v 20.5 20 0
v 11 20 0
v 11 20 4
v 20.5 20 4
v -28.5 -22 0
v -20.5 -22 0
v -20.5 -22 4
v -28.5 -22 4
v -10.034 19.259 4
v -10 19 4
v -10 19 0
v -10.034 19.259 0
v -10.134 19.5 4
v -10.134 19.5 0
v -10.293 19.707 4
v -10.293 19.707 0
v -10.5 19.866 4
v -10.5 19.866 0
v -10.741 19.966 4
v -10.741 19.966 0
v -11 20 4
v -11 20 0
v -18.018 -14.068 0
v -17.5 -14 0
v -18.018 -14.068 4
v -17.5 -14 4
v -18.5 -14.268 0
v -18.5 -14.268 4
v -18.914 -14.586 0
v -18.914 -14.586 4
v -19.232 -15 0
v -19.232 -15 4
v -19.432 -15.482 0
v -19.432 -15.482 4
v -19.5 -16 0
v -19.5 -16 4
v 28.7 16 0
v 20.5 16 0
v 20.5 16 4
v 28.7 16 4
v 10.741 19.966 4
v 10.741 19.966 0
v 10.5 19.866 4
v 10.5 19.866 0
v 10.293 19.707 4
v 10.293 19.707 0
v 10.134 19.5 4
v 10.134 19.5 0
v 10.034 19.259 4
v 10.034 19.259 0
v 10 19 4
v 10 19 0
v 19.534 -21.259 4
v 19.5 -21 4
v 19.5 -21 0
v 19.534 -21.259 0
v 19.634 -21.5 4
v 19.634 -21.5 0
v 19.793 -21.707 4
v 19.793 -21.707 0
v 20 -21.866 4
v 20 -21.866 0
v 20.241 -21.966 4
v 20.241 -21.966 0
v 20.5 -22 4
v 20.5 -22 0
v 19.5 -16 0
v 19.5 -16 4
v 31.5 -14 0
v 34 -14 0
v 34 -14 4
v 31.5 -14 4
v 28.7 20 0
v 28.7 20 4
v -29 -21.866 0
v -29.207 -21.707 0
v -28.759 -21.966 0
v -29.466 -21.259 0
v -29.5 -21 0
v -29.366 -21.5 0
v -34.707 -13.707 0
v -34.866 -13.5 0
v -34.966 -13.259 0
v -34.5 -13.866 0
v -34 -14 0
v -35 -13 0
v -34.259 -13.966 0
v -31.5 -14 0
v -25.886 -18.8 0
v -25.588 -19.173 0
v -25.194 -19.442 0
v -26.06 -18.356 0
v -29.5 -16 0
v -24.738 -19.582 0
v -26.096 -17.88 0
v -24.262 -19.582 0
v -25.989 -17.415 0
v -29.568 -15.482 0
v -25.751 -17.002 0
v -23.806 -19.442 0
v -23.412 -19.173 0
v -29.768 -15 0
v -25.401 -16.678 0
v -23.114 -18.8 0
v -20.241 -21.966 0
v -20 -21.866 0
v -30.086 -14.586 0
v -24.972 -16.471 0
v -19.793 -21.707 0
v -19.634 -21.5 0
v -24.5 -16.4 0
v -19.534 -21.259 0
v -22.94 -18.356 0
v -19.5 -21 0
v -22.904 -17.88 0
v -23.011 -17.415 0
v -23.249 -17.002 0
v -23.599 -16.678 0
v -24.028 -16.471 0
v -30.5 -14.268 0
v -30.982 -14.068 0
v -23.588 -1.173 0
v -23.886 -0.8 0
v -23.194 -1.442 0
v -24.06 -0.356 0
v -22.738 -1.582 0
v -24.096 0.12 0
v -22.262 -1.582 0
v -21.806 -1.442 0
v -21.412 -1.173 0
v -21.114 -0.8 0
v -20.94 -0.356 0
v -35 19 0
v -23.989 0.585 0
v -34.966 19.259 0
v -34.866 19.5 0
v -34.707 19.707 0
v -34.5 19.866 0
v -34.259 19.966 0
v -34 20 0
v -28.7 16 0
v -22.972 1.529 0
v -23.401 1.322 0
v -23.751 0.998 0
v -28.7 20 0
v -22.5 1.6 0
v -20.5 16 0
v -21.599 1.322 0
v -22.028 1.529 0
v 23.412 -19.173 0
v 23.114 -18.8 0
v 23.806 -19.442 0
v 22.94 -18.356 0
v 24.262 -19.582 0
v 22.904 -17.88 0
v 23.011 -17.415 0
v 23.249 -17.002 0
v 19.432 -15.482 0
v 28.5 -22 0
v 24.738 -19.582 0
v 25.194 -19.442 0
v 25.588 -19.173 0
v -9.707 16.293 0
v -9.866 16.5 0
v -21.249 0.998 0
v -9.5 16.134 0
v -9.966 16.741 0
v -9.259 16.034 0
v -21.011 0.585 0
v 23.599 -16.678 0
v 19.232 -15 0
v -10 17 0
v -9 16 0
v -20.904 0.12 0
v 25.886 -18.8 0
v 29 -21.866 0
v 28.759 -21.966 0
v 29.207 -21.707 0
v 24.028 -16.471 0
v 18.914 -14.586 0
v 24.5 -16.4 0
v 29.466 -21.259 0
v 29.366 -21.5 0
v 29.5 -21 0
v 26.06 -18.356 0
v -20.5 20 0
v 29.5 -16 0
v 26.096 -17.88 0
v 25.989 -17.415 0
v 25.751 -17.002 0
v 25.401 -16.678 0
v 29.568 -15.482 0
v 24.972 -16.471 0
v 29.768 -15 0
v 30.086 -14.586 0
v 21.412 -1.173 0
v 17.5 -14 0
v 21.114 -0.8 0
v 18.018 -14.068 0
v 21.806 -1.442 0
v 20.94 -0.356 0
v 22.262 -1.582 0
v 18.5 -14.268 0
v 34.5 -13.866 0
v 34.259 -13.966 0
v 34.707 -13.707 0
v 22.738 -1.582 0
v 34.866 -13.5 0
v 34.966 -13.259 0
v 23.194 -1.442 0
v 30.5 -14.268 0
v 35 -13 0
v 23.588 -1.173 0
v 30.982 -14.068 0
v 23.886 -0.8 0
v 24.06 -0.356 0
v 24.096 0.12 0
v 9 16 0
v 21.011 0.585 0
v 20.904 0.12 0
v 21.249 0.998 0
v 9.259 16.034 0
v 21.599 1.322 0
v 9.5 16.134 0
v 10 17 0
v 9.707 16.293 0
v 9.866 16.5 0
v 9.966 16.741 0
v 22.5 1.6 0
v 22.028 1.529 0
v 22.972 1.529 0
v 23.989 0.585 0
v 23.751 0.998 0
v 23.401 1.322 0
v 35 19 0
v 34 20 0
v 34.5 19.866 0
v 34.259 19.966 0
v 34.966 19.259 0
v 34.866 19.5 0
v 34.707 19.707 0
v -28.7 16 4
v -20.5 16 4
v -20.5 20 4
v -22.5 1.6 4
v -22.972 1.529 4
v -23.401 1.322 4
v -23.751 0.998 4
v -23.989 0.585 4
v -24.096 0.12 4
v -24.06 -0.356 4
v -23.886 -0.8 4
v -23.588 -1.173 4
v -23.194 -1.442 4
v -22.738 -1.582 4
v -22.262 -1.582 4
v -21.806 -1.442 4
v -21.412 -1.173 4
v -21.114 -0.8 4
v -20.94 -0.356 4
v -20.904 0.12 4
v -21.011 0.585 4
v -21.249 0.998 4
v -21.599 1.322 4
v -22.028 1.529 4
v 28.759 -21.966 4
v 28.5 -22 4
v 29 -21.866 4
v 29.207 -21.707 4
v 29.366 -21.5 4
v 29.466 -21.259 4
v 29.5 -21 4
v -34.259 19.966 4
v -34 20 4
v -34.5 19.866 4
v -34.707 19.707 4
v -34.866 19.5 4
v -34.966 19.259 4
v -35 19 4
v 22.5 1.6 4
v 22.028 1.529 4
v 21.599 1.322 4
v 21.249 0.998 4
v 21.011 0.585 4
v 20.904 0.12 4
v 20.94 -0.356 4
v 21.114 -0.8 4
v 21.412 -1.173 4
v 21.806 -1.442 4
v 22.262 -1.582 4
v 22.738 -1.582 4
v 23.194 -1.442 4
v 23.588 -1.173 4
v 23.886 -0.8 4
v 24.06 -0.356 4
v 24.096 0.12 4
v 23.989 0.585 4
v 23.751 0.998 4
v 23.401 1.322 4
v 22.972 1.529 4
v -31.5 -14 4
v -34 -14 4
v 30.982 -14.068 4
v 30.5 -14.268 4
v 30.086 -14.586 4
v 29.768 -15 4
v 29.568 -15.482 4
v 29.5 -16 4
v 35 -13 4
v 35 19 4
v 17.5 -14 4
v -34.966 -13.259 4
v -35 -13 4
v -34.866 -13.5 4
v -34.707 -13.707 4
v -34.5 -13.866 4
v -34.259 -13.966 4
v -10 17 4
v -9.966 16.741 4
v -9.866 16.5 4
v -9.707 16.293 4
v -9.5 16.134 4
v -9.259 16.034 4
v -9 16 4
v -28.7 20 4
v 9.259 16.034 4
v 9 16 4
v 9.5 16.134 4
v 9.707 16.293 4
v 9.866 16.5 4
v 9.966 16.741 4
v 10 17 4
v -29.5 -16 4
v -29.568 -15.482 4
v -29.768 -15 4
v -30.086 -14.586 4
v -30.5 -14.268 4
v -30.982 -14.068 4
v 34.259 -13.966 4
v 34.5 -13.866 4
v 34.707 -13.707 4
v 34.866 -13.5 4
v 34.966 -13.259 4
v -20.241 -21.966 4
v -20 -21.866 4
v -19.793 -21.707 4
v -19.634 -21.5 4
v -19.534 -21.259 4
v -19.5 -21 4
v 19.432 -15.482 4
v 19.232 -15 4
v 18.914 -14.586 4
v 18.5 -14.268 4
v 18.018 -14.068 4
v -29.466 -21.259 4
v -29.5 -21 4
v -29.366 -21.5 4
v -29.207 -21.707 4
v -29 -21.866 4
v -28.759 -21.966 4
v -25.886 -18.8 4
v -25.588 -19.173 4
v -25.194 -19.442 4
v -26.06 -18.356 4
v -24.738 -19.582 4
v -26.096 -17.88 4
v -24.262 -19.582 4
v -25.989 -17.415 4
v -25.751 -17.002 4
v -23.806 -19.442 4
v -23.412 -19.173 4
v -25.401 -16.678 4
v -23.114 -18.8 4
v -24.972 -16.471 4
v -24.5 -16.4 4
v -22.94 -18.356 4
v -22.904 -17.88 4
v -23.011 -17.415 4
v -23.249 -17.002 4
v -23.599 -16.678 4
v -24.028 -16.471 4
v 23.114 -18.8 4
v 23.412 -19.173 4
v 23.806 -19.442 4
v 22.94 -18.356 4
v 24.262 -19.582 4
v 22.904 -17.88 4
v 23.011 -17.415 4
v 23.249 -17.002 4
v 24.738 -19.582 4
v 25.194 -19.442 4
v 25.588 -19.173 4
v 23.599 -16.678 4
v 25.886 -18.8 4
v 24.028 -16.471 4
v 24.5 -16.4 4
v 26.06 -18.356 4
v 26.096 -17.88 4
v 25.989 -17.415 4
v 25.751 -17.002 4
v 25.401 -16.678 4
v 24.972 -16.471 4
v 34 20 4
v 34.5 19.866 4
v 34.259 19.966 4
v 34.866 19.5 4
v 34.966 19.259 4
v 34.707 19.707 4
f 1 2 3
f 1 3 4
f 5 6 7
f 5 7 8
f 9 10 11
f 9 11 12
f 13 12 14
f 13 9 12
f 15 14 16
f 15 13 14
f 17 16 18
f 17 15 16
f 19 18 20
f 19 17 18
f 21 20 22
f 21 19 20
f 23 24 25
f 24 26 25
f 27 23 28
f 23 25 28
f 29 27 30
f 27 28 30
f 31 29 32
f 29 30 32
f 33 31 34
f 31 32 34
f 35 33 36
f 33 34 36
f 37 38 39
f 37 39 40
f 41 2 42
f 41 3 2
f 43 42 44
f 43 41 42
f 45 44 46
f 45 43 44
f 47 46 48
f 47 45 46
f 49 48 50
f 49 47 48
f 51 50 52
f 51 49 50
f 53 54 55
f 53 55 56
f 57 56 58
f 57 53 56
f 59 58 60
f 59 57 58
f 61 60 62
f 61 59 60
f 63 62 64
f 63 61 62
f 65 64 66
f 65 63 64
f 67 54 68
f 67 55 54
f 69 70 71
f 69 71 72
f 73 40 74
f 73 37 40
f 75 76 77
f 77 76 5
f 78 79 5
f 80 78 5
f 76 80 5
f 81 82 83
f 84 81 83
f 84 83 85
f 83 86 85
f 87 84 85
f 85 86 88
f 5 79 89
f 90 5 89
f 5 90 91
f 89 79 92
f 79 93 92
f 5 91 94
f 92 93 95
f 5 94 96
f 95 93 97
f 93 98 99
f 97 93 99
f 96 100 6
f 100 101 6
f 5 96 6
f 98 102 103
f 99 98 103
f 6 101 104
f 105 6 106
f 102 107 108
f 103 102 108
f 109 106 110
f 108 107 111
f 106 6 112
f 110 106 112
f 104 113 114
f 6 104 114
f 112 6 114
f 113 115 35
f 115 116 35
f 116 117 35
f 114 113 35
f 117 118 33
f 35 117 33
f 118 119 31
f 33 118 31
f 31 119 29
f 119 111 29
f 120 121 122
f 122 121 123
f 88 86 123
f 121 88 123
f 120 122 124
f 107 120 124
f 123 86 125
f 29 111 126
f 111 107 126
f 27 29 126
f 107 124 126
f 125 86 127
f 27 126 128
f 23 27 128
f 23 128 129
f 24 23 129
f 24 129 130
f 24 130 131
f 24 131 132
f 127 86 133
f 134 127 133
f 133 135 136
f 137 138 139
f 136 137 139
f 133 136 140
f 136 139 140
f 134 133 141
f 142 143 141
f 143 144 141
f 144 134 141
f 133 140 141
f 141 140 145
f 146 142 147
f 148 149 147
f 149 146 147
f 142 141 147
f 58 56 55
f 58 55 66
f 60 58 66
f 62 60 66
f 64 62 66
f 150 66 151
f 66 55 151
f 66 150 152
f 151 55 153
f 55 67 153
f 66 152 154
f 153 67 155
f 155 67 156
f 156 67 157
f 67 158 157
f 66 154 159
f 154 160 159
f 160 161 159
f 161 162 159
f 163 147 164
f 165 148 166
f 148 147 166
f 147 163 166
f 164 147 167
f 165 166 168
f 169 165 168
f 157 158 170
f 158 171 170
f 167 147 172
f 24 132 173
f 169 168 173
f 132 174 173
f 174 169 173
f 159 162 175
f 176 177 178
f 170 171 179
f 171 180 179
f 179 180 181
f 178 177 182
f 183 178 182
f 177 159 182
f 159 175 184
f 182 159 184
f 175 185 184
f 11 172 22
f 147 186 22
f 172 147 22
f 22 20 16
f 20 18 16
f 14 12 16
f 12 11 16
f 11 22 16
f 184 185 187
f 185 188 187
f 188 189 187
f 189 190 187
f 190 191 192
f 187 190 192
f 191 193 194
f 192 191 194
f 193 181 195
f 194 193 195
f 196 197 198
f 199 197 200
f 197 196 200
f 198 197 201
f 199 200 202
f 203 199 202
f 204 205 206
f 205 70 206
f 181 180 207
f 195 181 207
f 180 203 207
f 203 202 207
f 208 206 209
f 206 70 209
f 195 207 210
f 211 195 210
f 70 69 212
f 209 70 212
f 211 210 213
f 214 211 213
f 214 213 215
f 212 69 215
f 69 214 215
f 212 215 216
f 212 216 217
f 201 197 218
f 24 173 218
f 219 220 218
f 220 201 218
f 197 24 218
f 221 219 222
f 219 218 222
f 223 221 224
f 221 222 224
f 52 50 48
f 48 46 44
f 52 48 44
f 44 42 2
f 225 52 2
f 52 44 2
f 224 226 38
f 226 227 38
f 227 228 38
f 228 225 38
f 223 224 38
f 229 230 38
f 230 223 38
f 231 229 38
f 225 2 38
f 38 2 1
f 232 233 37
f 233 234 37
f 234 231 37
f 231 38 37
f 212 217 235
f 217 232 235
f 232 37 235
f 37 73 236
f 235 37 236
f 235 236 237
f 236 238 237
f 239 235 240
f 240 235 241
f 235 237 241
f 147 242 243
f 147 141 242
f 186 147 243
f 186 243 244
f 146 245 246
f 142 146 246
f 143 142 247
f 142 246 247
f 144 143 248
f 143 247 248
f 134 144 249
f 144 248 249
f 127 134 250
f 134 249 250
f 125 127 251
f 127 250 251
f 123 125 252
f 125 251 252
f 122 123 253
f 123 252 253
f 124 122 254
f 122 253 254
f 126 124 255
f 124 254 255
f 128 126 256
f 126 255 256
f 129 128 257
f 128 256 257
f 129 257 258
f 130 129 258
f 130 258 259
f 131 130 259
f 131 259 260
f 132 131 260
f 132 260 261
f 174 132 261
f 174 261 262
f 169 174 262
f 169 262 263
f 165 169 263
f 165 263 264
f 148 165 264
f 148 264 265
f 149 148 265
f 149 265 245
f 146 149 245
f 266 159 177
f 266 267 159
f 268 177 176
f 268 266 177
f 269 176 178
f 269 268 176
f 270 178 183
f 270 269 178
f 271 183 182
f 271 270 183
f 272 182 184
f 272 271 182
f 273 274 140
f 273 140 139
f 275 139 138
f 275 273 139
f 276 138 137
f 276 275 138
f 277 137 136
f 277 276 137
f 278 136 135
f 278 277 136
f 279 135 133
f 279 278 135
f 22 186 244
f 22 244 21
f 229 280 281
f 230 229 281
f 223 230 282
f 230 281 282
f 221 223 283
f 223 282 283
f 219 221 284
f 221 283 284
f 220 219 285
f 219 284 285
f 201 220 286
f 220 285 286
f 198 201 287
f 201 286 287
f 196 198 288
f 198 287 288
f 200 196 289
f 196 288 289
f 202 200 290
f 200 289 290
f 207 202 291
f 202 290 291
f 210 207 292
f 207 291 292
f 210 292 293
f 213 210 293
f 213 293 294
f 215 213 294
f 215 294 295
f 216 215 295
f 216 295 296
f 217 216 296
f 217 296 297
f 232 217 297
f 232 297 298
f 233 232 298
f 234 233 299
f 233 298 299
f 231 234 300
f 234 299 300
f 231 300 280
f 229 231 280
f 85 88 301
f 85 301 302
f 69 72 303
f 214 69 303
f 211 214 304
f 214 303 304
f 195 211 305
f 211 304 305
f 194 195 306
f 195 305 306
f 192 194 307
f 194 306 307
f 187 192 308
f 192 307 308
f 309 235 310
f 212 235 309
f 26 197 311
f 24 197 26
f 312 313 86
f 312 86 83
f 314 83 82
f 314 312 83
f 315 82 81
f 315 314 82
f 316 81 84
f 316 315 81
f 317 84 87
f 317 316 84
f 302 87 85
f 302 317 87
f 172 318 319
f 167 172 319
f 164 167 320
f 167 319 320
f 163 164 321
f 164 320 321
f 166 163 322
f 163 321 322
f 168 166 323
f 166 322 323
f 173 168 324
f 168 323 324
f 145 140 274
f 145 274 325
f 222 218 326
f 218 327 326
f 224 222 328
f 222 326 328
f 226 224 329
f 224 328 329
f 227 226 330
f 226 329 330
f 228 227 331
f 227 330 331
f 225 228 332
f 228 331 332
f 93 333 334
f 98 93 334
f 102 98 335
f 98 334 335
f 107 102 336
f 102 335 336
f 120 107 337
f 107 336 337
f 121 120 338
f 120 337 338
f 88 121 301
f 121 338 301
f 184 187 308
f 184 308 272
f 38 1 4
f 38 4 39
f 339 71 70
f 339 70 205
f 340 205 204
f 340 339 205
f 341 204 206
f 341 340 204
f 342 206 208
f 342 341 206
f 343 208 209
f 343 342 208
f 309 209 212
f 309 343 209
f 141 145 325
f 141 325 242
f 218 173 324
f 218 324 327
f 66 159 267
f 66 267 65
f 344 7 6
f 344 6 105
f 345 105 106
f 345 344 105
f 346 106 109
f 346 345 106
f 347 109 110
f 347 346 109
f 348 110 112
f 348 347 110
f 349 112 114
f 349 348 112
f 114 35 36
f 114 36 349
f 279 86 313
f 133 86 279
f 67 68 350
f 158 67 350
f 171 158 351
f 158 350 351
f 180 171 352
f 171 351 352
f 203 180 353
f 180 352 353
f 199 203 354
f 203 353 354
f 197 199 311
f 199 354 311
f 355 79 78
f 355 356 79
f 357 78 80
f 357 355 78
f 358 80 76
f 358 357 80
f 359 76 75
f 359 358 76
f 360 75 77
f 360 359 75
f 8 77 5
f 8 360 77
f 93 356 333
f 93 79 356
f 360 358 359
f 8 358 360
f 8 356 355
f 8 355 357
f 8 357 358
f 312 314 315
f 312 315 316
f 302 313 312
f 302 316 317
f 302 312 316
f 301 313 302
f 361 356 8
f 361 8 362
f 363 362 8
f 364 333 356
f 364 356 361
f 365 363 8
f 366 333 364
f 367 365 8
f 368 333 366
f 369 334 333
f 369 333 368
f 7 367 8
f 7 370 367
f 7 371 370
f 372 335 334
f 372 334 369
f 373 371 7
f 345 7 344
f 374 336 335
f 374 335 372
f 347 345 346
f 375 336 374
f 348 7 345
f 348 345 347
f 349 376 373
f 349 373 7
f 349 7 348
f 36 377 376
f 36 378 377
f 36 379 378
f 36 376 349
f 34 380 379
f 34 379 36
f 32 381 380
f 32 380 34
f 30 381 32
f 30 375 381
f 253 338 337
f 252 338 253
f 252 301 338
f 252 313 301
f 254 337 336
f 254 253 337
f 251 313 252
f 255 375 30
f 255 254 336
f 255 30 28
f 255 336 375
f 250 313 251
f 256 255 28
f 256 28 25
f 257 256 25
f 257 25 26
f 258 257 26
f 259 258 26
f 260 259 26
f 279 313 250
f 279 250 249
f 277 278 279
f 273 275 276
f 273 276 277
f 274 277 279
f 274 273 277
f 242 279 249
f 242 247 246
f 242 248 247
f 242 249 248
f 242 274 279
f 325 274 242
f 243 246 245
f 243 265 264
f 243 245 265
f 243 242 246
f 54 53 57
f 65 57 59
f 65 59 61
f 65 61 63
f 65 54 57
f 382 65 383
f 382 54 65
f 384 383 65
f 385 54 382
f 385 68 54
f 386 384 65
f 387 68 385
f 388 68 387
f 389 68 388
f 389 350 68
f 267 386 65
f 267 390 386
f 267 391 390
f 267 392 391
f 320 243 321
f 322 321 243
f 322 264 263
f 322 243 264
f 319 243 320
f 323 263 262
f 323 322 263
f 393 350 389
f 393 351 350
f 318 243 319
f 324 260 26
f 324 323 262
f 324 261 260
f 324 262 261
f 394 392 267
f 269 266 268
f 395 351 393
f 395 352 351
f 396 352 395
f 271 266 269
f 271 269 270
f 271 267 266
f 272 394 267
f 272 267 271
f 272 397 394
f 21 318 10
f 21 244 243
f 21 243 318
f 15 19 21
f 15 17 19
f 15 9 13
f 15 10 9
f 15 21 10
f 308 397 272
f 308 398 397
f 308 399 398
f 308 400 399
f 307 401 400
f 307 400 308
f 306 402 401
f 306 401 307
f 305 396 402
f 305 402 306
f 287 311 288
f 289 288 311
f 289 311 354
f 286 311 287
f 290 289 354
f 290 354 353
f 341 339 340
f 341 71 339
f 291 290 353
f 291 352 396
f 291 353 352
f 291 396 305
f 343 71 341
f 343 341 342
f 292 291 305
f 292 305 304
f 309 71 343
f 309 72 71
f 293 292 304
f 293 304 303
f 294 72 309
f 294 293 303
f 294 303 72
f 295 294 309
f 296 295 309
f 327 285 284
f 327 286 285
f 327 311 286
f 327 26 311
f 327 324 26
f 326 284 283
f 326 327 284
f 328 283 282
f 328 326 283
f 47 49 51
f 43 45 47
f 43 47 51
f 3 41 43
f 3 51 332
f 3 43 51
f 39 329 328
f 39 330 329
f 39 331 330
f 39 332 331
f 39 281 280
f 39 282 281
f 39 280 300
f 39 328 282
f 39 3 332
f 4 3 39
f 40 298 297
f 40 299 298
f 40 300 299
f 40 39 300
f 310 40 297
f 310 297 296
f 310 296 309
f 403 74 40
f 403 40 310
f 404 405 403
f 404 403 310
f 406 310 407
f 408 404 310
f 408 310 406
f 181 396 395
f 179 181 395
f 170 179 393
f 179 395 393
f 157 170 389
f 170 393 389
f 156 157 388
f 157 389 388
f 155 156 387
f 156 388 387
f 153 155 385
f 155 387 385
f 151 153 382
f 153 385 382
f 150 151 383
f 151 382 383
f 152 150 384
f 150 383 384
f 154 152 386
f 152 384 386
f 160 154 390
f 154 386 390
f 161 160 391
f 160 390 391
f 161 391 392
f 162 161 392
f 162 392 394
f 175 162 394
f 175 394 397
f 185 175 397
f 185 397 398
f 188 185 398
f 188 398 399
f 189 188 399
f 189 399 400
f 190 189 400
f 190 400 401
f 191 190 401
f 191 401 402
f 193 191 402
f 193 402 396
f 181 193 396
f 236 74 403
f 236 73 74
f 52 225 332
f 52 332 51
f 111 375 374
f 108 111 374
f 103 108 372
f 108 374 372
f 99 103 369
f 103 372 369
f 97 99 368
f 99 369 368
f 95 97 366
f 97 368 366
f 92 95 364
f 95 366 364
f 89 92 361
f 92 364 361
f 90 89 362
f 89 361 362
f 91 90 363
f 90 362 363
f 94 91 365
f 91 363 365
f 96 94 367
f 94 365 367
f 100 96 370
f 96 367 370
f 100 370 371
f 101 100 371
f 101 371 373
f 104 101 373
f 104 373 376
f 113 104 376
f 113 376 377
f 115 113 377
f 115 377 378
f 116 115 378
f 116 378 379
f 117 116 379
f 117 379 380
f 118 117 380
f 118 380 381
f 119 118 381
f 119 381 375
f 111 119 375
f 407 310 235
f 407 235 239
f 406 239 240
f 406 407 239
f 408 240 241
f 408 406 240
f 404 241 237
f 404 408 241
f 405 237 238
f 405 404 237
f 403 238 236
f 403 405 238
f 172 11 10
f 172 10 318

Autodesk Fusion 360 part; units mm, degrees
sketch "スケッチ1" plane through (0, 0, 0) normal (0, 0, 1) x (1, 0, 0)
  line L0 (-20.5, 20) -> (20.5, 20)
  line L1 (20.5, 20) -> (20.5, 16)
  line L2 (20.5, 16) -> (28.7, 16)
  line L3 (28.7, 16) -> (28.7, 20)
  line L4 (28.7, 20) -> (35, 20)
  line L5 (35, 20) -> (35, -14)
  line L6 (35, -14) -> (29.5, -14)
  line L7 (29.5, -14) -> (29.5, -22)
  line L8 (29.5, -22) -> (19.5, -22)
  line L9 (19.5, -22) -> (19.5, -14)
  line L10 (19.5, -14) -> (-19.5, -14)
  line L11 (-19.5, -14) -> (-19.5, -22)
  line L12 (-19.5, -22) -> (-29.5, -22)
  line L13 (-29.5, -22) -> (-29.5, -14)
  line L14 (-29.5, -14) -> (-35, -14)
  line L15 (-35, -14) -> (-35, 20)
  line L16 (-35, 20) -> (-28.7, 20)
  line L17 (-28.7, 20) -> (-28.7, 16)
  line L18 (-28.7, 16) -> (-20.5, 16)
  line L19 (-20.5, 16) -> (-20.5, 20)
  line L20 (-22.5, 0) -> (22.5, 0)
  line L21 (-24.5, -22) -> (-24.5, -18)
  line L22 (24.5, -22) -> (24.5, -18)
  line L23 (-10, 16) -> (10, 16)
  line L24 (10, 16) -> (10, 20)
  line L25 (10, 20) -> (-10, 20)
  line L26 (-10, 20) -> (-10, 16)
  point P0 (0, 20)
  point P1 (0, -14)
  dimension "d1" = 16
  dimension "d2" = 4
  dimension "d4" = 14
  dimension "d5" = 8
  dimension "d6" = 41
  dimension "d7" = 8.2
  dimension "d8" = 8.2
  dimension "d9" = 70
  dimension "d10" = 45
  dimension "d16" = 39
  dimension "d17" = 10
  dimension "d18" = 10
  dimension "d19" = 4
  dimension "d24" = 20
  dimension "d25" = 4
extrude "押し出し1" add sketch "スケッチ1" along normal blind 4 contours L0 L1 L2 L3 L4 L5 L6 L7 L8 L9 L10 L11 L12 L13 L14 L15 L16 L17 L18 L19 L23 L24 L26
hole "穴1" at (-22.5, 0, 0) at (22.5, 0, 0) at (-24.5, -18, 0) at (24.5, -18, 0) direction (0, 0, 1) diameter 3.2 end through all
fillet "フィレット1" radius 1 12 edges at (35, 20, 2) (35, -14, 2) (29.5, -22, 2) (19.5, -22, 2) (-19.5, -22, 2) (-29.5, -22, 2) (-35, -14, 2) (-35, 20, 2) (10, 20, 2) (-10, 20, 2) (10, 16, 2) (-10, 16, 2)
fillet "フィレット2" radius 2 4 edges at (29.5, -14, 2) (19.5, -14, 2) (-19.5, -14, 2) (-29.5, -14, 2)
